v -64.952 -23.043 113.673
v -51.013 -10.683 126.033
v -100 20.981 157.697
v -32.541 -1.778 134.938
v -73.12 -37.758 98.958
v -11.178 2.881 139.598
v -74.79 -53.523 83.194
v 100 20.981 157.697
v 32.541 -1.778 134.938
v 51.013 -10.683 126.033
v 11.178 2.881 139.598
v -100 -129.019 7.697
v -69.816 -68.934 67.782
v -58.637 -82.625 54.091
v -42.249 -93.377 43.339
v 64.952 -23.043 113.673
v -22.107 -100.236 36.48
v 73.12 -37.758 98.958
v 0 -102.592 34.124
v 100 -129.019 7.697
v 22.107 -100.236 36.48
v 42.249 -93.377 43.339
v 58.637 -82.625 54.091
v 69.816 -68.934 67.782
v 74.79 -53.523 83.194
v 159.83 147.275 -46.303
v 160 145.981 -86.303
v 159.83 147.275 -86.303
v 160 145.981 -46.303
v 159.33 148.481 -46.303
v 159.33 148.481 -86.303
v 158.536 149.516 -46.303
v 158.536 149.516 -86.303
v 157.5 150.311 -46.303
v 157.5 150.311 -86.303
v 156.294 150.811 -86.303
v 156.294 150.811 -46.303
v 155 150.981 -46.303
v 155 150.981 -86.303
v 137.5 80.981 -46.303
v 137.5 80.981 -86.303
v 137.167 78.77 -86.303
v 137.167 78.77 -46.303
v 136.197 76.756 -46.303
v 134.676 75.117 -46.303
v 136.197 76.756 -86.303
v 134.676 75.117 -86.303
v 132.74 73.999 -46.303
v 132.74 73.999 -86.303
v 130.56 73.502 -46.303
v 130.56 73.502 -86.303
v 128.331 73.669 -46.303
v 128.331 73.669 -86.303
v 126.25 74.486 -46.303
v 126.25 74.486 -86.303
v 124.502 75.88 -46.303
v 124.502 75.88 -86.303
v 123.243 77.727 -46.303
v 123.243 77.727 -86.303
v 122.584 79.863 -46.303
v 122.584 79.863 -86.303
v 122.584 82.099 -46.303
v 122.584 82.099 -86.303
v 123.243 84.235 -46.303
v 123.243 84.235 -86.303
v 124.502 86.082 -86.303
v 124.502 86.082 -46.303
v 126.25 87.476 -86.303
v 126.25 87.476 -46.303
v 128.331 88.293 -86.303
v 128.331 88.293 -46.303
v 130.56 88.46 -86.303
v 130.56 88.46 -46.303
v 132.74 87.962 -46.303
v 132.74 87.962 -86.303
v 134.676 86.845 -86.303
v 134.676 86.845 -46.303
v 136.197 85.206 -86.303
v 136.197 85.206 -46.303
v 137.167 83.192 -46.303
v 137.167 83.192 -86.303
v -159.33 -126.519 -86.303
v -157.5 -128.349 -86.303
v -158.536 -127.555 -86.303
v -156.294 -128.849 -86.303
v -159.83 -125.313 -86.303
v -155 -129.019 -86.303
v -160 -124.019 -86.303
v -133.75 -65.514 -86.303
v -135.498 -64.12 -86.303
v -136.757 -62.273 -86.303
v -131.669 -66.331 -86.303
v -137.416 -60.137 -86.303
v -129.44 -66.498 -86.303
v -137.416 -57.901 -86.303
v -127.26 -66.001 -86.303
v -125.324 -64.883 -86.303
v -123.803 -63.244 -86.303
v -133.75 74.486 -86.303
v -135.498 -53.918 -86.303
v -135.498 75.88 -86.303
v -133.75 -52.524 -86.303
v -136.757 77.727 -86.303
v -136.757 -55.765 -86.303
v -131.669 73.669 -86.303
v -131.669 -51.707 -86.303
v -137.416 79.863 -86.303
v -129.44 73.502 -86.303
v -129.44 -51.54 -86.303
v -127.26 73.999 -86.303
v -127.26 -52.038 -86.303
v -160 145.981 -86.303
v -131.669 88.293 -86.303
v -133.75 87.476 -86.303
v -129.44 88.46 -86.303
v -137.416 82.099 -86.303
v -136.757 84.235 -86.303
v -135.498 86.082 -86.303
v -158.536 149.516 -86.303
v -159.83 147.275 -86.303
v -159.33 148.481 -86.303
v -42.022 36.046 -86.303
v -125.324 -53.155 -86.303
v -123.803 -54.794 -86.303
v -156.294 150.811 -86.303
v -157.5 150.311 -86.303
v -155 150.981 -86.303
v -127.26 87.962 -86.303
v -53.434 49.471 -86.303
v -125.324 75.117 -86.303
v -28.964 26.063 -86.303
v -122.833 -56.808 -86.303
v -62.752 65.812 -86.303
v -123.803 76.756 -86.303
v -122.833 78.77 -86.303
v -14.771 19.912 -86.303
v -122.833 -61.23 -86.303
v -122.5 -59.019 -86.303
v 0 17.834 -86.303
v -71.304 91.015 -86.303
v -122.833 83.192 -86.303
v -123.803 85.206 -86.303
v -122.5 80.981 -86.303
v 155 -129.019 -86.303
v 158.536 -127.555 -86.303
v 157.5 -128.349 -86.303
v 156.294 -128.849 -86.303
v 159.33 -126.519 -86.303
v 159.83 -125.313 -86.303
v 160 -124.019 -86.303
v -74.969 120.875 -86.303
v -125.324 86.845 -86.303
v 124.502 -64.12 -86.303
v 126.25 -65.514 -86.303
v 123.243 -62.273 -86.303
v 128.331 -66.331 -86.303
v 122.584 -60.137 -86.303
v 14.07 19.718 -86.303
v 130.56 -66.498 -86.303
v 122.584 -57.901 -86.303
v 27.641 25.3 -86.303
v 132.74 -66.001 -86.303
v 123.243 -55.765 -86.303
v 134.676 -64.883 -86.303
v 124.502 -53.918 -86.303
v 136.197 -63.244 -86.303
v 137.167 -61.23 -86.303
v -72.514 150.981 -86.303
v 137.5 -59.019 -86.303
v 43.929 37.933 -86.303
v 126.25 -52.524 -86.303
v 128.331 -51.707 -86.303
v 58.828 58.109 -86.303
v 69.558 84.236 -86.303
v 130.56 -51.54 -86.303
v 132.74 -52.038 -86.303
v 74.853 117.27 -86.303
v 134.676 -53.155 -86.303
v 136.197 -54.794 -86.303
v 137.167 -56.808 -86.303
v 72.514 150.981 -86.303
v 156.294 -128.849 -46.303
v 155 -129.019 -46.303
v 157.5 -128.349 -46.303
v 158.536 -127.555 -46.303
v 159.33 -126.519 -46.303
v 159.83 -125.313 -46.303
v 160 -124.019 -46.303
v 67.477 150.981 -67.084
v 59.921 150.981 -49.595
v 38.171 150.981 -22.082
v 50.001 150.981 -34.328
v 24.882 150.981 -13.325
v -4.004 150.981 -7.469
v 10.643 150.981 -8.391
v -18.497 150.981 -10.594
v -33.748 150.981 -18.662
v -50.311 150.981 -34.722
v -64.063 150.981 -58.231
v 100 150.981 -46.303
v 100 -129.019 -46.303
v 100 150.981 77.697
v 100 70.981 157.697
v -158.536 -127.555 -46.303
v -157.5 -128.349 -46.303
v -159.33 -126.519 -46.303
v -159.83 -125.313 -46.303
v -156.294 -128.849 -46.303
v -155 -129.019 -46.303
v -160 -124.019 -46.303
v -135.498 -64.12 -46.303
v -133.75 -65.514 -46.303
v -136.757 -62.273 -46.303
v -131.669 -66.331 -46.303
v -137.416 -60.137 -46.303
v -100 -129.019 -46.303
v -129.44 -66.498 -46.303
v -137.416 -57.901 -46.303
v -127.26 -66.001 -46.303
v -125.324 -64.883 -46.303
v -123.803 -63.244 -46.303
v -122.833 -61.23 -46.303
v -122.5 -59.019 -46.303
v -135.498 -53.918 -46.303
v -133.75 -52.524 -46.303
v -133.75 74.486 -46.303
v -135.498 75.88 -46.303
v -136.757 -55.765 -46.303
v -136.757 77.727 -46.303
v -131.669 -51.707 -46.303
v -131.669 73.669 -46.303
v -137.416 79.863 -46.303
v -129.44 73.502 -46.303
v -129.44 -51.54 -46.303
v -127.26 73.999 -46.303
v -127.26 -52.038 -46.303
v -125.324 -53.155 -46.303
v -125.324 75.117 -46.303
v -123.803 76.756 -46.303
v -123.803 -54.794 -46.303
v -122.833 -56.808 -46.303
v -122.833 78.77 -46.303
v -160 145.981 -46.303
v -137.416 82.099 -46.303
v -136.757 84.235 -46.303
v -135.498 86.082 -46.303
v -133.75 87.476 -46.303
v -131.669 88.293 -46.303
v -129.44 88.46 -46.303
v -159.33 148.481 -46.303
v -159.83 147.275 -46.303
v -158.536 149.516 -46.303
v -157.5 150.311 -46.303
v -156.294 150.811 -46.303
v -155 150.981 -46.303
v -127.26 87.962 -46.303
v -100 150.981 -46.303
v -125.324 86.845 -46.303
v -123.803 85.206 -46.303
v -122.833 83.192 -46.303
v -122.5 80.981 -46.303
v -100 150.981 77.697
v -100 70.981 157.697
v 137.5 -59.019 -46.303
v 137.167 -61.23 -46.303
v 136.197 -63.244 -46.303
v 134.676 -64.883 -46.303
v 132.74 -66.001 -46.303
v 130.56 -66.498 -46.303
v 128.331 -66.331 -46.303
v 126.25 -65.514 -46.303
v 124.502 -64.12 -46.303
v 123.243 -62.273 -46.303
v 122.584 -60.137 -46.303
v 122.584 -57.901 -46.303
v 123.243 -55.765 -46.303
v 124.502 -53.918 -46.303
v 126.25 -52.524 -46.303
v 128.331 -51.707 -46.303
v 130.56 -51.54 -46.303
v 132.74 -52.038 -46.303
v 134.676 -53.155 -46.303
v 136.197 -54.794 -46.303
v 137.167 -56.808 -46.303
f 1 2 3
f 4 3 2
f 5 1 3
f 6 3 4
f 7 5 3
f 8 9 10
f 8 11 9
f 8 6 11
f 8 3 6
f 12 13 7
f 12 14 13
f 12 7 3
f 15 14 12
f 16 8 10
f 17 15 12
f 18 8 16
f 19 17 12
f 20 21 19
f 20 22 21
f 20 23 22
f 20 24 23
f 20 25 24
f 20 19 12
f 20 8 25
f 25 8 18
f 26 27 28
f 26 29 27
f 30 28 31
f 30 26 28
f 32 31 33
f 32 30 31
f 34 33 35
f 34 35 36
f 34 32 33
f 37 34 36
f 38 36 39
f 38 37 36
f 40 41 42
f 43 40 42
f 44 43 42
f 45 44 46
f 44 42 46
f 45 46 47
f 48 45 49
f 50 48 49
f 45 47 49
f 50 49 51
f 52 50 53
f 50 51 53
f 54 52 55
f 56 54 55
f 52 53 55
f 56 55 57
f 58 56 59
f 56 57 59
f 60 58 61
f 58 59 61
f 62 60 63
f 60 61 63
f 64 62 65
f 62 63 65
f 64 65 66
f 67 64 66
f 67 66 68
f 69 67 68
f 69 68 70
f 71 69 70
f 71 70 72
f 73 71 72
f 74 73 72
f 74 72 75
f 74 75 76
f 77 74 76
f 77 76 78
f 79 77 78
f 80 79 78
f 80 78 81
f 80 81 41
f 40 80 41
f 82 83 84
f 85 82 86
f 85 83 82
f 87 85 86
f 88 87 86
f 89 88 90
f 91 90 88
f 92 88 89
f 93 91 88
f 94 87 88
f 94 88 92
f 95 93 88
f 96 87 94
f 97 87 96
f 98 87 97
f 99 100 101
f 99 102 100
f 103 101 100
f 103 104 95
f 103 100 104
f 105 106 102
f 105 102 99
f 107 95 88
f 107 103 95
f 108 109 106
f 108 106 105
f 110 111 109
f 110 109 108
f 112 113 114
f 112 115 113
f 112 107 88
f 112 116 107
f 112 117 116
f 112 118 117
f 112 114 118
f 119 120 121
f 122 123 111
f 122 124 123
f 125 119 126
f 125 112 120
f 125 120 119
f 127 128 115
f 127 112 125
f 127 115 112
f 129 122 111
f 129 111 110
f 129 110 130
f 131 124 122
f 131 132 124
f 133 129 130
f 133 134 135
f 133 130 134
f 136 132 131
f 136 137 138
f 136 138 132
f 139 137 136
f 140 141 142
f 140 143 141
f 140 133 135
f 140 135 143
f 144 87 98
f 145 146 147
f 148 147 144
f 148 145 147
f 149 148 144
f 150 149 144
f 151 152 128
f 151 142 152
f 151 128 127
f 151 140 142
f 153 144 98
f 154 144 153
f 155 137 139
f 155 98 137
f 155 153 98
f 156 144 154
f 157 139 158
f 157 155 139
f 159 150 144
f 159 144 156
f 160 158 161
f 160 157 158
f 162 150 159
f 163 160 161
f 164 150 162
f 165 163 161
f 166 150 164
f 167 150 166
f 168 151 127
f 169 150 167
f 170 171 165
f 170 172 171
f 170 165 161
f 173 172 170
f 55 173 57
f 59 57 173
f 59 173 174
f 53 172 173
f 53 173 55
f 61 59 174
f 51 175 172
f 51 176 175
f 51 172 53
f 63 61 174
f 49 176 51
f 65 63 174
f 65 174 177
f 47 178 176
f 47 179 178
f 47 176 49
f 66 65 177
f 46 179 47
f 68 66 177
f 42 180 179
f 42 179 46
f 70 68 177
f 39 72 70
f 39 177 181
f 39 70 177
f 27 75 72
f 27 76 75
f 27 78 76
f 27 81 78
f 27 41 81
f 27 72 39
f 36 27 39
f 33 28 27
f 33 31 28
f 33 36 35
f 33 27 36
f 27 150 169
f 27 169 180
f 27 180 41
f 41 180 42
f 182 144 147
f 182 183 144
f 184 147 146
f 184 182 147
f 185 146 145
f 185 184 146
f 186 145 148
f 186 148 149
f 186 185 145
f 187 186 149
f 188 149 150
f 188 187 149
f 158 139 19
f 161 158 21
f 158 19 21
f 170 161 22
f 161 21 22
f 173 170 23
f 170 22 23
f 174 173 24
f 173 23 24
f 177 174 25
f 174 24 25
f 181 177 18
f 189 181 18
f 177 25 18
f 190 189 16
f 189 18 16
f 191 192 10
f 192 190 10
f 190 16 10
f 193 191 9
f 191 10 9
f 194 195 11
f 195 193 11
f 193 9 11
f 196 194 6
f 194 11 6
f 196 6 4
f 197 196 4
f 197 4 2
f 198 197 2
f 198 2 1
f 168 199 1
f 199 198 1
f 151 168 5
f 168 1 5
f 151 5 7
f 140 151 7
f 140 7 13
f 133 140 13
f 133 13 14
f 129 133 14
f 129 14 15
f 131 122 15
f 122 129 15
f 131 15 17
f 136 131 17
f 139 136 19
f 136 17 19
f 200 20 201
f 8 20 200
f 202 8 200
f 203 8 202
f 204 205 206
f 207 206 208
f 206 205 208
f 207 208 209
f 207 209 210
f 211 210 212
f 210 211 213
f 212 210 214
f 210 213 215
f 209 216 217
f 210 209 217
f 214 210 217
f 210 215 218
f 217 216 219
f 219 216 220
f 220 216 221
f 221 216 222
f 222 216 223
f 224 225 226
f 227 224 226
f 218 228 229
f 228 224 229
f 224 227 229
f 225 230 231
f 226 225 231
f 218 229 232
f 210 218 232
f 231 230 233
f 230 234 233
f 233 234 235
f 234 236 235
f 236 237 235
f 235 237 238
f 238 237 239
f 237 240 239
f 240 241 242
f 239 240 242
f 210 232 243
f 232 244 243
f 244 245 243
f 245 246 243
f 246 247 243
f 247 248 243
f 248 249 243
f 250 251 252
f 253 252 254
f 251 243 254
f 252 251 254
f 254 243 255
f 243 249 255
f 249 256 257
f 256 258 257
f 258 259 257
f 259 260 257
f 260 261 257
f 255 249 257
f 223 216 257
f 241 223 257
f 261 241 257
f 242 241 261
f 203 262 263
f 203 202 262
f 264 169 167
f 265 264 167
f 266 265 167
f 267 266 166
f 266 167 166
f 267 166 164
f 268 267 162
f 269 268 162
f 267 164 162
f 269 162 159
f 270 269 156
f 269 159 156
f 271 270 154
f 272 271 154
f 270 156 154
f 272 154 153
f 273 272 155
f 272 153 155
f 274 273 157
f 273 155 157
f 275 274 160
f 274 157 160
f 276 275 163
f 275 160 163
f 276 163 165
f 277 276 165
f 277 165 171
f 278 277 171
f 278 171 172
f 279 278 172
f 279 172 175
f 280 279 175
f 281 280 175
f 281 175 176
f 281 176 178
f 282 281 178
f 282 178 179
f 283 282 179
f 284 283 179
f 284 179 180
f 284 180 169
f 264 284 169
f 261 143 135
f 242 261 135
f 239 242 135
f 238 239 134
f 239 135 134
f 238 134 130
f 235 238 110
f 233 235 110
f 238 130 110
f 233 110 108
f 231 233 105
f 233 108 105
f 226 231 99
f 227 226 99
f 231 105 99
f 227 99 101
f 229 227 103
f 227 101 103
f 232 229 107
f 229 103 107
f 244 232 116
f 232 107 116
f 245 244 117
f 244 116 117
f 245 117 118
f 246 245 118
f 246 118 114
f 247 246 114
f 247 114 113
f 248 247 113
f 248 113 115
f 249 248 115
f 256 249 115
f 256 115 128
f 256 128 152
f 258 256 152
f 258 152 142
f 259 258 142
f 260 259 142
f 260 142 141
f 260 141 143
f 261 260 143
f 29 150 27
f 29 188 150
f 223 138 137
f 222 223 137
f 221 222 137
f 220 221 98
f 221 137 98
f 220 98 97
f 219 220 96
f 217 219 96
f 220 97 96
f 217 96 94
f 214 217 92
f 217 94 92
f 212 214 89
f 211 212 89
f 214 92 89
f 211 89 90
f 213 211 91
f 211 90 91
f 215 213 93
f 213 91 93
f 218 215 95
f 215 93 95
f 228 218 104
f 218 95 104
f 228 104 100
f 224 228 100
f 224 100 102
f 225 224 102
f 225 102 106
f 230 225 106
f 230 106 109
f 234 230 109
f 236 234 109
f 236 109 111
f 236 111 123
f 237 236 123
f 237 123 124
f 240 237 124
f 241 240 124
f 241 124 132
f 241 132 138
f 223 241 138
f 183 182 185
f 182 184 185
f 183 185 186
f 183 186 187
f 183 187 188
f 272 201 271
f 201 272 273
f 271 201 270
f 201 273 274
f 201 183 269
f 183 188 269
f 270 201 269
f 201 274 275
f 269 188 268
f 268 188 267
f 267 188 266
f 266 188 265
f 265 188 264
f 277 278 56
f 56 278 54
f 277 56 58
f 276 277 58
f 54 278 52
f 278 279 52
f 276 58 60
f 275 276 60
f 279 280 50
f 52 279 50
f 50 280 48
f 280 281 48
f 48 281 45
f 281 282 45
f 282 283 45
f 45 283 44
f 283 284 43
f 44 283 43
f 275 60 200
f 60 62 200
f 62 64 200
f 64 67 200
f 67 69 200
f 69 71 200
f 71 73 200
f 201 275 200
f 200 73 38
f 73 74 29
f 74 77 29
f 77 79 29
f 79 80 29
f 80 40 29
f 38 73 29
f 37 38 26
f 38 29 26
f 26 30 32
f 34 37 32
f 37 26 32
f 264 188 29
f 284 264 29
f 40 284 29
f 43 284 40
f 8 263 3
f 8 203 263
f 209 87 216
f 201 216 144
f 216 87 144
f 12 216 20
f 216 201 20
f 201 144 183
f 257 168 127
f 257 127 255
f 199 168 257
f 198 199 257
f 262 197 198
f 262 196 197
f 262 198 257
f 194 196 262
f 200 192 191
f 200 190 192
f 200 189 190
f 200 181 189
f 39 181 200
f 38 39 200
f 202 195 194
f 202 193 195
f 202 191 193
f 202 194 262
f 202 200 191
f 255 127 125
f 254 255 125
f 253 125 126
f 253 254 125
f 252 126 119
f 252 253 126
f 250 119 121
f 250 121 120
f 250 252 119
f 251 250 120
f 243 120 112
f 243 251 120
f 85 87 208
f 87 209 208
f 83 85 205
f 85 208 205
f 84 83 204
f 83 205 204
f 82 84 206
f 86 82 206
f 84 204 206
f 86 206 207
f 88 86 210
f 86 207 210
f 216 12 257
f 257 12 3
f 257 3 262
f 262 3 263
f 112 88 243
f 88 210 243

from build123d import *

# Parameters (mm, degrees)
F0_W     = 280
F0_H     = 40
F1_DEPTH = 160
F2_R     = 5
F3_R     = 7.5
F4_DEPTH = 50
F5_DEPTH = 100
F7_DEPTH = 81751


with BuildPart() as f1:
    # F0 (on Right) → F1 (new body, symmetric)
    with BuildSketch(Plane.YZ):
        with Locations((10.9808796245, -66.3028520482)):
            Rectangle(F0_W, F0_H)
    extrude(amount=F1_DEPTH, both=True)

    # F2
    f2_edges = [f1.edges().sort_by_distance(p)[0] for p in [
        (160, -129.01912, -66.302852),
        (-160, -129.01912, -66.302852),
        (160, 150.98088, -66.302852),
        (-160, 150.98088, -66.302852),
    ]]
    fillet(f2_edges, radius=F2_R)

    # F3 (on face) → F4 (cut)
    with BuildSketch(Plane(origin=(0, 0, -86.3028520482), x_dir=(1, 0, 0), z_dir=(0, 0, -1))):
        with Locations((130, -80.9808796245)):
            Circle(F3_R)
        with Locations((130, 59.0191203755)):
            Circle(F3_R)
        with Locations((-130, -80.9808796245)):
            Circle(F3_R)
        with Locations((-130, 59.0191203755)):
            Circle(F3_R)
    extrude(amount=-F4_DEPTH, mode=Mode.SUBTRACT)

    # F0 (on Right) → F5 (join, symmetric)
    with BuildSketch(Plane.YZ):
        Polygon((20.9808796245, 157.6971479518), (-129.0191203755, 7.6971479518), (-129.0191203755, -46.3028520482), (150.9808796245, -46.3028520482), (150.9808796245, 77.6971479518), (70.9808796245, 157.6971479518), align=None)
    extrude(amount=F5_DEPTH, both=True)

    # F6 (on face) → F7 (cut)
    with BuildSketch(Plane(origin=(0, -68.3581341637, 68.3581341637), x_dir=(1, 0, 0), z_dir=(0, -0.7071067812, 0.7071067812))):
        with BuildLine():
            Line((0, -48.4145147354), (0, 101.5854852646))
            ThreePointArc((0, 101.5854852646), (-75, 26.5854852646), (0, -48.4145147354))
        make_face()
        with BuildLine():
            ThreePointArc((75, 26.5854852646), (53.033008589, 79.6184938536), (0, 101.5854852646))
            Line((0, 101.5854852646), (0, -48.4145147354))
            ThreePointArc((0, -48.4145147354), (53.033008589, -26.4475233244), (75, 26.5854852646))
        make_face()
    extrude(amount=-F7_DEPTH, mode=Mode.SUBTRACT)


solid = f1.part
